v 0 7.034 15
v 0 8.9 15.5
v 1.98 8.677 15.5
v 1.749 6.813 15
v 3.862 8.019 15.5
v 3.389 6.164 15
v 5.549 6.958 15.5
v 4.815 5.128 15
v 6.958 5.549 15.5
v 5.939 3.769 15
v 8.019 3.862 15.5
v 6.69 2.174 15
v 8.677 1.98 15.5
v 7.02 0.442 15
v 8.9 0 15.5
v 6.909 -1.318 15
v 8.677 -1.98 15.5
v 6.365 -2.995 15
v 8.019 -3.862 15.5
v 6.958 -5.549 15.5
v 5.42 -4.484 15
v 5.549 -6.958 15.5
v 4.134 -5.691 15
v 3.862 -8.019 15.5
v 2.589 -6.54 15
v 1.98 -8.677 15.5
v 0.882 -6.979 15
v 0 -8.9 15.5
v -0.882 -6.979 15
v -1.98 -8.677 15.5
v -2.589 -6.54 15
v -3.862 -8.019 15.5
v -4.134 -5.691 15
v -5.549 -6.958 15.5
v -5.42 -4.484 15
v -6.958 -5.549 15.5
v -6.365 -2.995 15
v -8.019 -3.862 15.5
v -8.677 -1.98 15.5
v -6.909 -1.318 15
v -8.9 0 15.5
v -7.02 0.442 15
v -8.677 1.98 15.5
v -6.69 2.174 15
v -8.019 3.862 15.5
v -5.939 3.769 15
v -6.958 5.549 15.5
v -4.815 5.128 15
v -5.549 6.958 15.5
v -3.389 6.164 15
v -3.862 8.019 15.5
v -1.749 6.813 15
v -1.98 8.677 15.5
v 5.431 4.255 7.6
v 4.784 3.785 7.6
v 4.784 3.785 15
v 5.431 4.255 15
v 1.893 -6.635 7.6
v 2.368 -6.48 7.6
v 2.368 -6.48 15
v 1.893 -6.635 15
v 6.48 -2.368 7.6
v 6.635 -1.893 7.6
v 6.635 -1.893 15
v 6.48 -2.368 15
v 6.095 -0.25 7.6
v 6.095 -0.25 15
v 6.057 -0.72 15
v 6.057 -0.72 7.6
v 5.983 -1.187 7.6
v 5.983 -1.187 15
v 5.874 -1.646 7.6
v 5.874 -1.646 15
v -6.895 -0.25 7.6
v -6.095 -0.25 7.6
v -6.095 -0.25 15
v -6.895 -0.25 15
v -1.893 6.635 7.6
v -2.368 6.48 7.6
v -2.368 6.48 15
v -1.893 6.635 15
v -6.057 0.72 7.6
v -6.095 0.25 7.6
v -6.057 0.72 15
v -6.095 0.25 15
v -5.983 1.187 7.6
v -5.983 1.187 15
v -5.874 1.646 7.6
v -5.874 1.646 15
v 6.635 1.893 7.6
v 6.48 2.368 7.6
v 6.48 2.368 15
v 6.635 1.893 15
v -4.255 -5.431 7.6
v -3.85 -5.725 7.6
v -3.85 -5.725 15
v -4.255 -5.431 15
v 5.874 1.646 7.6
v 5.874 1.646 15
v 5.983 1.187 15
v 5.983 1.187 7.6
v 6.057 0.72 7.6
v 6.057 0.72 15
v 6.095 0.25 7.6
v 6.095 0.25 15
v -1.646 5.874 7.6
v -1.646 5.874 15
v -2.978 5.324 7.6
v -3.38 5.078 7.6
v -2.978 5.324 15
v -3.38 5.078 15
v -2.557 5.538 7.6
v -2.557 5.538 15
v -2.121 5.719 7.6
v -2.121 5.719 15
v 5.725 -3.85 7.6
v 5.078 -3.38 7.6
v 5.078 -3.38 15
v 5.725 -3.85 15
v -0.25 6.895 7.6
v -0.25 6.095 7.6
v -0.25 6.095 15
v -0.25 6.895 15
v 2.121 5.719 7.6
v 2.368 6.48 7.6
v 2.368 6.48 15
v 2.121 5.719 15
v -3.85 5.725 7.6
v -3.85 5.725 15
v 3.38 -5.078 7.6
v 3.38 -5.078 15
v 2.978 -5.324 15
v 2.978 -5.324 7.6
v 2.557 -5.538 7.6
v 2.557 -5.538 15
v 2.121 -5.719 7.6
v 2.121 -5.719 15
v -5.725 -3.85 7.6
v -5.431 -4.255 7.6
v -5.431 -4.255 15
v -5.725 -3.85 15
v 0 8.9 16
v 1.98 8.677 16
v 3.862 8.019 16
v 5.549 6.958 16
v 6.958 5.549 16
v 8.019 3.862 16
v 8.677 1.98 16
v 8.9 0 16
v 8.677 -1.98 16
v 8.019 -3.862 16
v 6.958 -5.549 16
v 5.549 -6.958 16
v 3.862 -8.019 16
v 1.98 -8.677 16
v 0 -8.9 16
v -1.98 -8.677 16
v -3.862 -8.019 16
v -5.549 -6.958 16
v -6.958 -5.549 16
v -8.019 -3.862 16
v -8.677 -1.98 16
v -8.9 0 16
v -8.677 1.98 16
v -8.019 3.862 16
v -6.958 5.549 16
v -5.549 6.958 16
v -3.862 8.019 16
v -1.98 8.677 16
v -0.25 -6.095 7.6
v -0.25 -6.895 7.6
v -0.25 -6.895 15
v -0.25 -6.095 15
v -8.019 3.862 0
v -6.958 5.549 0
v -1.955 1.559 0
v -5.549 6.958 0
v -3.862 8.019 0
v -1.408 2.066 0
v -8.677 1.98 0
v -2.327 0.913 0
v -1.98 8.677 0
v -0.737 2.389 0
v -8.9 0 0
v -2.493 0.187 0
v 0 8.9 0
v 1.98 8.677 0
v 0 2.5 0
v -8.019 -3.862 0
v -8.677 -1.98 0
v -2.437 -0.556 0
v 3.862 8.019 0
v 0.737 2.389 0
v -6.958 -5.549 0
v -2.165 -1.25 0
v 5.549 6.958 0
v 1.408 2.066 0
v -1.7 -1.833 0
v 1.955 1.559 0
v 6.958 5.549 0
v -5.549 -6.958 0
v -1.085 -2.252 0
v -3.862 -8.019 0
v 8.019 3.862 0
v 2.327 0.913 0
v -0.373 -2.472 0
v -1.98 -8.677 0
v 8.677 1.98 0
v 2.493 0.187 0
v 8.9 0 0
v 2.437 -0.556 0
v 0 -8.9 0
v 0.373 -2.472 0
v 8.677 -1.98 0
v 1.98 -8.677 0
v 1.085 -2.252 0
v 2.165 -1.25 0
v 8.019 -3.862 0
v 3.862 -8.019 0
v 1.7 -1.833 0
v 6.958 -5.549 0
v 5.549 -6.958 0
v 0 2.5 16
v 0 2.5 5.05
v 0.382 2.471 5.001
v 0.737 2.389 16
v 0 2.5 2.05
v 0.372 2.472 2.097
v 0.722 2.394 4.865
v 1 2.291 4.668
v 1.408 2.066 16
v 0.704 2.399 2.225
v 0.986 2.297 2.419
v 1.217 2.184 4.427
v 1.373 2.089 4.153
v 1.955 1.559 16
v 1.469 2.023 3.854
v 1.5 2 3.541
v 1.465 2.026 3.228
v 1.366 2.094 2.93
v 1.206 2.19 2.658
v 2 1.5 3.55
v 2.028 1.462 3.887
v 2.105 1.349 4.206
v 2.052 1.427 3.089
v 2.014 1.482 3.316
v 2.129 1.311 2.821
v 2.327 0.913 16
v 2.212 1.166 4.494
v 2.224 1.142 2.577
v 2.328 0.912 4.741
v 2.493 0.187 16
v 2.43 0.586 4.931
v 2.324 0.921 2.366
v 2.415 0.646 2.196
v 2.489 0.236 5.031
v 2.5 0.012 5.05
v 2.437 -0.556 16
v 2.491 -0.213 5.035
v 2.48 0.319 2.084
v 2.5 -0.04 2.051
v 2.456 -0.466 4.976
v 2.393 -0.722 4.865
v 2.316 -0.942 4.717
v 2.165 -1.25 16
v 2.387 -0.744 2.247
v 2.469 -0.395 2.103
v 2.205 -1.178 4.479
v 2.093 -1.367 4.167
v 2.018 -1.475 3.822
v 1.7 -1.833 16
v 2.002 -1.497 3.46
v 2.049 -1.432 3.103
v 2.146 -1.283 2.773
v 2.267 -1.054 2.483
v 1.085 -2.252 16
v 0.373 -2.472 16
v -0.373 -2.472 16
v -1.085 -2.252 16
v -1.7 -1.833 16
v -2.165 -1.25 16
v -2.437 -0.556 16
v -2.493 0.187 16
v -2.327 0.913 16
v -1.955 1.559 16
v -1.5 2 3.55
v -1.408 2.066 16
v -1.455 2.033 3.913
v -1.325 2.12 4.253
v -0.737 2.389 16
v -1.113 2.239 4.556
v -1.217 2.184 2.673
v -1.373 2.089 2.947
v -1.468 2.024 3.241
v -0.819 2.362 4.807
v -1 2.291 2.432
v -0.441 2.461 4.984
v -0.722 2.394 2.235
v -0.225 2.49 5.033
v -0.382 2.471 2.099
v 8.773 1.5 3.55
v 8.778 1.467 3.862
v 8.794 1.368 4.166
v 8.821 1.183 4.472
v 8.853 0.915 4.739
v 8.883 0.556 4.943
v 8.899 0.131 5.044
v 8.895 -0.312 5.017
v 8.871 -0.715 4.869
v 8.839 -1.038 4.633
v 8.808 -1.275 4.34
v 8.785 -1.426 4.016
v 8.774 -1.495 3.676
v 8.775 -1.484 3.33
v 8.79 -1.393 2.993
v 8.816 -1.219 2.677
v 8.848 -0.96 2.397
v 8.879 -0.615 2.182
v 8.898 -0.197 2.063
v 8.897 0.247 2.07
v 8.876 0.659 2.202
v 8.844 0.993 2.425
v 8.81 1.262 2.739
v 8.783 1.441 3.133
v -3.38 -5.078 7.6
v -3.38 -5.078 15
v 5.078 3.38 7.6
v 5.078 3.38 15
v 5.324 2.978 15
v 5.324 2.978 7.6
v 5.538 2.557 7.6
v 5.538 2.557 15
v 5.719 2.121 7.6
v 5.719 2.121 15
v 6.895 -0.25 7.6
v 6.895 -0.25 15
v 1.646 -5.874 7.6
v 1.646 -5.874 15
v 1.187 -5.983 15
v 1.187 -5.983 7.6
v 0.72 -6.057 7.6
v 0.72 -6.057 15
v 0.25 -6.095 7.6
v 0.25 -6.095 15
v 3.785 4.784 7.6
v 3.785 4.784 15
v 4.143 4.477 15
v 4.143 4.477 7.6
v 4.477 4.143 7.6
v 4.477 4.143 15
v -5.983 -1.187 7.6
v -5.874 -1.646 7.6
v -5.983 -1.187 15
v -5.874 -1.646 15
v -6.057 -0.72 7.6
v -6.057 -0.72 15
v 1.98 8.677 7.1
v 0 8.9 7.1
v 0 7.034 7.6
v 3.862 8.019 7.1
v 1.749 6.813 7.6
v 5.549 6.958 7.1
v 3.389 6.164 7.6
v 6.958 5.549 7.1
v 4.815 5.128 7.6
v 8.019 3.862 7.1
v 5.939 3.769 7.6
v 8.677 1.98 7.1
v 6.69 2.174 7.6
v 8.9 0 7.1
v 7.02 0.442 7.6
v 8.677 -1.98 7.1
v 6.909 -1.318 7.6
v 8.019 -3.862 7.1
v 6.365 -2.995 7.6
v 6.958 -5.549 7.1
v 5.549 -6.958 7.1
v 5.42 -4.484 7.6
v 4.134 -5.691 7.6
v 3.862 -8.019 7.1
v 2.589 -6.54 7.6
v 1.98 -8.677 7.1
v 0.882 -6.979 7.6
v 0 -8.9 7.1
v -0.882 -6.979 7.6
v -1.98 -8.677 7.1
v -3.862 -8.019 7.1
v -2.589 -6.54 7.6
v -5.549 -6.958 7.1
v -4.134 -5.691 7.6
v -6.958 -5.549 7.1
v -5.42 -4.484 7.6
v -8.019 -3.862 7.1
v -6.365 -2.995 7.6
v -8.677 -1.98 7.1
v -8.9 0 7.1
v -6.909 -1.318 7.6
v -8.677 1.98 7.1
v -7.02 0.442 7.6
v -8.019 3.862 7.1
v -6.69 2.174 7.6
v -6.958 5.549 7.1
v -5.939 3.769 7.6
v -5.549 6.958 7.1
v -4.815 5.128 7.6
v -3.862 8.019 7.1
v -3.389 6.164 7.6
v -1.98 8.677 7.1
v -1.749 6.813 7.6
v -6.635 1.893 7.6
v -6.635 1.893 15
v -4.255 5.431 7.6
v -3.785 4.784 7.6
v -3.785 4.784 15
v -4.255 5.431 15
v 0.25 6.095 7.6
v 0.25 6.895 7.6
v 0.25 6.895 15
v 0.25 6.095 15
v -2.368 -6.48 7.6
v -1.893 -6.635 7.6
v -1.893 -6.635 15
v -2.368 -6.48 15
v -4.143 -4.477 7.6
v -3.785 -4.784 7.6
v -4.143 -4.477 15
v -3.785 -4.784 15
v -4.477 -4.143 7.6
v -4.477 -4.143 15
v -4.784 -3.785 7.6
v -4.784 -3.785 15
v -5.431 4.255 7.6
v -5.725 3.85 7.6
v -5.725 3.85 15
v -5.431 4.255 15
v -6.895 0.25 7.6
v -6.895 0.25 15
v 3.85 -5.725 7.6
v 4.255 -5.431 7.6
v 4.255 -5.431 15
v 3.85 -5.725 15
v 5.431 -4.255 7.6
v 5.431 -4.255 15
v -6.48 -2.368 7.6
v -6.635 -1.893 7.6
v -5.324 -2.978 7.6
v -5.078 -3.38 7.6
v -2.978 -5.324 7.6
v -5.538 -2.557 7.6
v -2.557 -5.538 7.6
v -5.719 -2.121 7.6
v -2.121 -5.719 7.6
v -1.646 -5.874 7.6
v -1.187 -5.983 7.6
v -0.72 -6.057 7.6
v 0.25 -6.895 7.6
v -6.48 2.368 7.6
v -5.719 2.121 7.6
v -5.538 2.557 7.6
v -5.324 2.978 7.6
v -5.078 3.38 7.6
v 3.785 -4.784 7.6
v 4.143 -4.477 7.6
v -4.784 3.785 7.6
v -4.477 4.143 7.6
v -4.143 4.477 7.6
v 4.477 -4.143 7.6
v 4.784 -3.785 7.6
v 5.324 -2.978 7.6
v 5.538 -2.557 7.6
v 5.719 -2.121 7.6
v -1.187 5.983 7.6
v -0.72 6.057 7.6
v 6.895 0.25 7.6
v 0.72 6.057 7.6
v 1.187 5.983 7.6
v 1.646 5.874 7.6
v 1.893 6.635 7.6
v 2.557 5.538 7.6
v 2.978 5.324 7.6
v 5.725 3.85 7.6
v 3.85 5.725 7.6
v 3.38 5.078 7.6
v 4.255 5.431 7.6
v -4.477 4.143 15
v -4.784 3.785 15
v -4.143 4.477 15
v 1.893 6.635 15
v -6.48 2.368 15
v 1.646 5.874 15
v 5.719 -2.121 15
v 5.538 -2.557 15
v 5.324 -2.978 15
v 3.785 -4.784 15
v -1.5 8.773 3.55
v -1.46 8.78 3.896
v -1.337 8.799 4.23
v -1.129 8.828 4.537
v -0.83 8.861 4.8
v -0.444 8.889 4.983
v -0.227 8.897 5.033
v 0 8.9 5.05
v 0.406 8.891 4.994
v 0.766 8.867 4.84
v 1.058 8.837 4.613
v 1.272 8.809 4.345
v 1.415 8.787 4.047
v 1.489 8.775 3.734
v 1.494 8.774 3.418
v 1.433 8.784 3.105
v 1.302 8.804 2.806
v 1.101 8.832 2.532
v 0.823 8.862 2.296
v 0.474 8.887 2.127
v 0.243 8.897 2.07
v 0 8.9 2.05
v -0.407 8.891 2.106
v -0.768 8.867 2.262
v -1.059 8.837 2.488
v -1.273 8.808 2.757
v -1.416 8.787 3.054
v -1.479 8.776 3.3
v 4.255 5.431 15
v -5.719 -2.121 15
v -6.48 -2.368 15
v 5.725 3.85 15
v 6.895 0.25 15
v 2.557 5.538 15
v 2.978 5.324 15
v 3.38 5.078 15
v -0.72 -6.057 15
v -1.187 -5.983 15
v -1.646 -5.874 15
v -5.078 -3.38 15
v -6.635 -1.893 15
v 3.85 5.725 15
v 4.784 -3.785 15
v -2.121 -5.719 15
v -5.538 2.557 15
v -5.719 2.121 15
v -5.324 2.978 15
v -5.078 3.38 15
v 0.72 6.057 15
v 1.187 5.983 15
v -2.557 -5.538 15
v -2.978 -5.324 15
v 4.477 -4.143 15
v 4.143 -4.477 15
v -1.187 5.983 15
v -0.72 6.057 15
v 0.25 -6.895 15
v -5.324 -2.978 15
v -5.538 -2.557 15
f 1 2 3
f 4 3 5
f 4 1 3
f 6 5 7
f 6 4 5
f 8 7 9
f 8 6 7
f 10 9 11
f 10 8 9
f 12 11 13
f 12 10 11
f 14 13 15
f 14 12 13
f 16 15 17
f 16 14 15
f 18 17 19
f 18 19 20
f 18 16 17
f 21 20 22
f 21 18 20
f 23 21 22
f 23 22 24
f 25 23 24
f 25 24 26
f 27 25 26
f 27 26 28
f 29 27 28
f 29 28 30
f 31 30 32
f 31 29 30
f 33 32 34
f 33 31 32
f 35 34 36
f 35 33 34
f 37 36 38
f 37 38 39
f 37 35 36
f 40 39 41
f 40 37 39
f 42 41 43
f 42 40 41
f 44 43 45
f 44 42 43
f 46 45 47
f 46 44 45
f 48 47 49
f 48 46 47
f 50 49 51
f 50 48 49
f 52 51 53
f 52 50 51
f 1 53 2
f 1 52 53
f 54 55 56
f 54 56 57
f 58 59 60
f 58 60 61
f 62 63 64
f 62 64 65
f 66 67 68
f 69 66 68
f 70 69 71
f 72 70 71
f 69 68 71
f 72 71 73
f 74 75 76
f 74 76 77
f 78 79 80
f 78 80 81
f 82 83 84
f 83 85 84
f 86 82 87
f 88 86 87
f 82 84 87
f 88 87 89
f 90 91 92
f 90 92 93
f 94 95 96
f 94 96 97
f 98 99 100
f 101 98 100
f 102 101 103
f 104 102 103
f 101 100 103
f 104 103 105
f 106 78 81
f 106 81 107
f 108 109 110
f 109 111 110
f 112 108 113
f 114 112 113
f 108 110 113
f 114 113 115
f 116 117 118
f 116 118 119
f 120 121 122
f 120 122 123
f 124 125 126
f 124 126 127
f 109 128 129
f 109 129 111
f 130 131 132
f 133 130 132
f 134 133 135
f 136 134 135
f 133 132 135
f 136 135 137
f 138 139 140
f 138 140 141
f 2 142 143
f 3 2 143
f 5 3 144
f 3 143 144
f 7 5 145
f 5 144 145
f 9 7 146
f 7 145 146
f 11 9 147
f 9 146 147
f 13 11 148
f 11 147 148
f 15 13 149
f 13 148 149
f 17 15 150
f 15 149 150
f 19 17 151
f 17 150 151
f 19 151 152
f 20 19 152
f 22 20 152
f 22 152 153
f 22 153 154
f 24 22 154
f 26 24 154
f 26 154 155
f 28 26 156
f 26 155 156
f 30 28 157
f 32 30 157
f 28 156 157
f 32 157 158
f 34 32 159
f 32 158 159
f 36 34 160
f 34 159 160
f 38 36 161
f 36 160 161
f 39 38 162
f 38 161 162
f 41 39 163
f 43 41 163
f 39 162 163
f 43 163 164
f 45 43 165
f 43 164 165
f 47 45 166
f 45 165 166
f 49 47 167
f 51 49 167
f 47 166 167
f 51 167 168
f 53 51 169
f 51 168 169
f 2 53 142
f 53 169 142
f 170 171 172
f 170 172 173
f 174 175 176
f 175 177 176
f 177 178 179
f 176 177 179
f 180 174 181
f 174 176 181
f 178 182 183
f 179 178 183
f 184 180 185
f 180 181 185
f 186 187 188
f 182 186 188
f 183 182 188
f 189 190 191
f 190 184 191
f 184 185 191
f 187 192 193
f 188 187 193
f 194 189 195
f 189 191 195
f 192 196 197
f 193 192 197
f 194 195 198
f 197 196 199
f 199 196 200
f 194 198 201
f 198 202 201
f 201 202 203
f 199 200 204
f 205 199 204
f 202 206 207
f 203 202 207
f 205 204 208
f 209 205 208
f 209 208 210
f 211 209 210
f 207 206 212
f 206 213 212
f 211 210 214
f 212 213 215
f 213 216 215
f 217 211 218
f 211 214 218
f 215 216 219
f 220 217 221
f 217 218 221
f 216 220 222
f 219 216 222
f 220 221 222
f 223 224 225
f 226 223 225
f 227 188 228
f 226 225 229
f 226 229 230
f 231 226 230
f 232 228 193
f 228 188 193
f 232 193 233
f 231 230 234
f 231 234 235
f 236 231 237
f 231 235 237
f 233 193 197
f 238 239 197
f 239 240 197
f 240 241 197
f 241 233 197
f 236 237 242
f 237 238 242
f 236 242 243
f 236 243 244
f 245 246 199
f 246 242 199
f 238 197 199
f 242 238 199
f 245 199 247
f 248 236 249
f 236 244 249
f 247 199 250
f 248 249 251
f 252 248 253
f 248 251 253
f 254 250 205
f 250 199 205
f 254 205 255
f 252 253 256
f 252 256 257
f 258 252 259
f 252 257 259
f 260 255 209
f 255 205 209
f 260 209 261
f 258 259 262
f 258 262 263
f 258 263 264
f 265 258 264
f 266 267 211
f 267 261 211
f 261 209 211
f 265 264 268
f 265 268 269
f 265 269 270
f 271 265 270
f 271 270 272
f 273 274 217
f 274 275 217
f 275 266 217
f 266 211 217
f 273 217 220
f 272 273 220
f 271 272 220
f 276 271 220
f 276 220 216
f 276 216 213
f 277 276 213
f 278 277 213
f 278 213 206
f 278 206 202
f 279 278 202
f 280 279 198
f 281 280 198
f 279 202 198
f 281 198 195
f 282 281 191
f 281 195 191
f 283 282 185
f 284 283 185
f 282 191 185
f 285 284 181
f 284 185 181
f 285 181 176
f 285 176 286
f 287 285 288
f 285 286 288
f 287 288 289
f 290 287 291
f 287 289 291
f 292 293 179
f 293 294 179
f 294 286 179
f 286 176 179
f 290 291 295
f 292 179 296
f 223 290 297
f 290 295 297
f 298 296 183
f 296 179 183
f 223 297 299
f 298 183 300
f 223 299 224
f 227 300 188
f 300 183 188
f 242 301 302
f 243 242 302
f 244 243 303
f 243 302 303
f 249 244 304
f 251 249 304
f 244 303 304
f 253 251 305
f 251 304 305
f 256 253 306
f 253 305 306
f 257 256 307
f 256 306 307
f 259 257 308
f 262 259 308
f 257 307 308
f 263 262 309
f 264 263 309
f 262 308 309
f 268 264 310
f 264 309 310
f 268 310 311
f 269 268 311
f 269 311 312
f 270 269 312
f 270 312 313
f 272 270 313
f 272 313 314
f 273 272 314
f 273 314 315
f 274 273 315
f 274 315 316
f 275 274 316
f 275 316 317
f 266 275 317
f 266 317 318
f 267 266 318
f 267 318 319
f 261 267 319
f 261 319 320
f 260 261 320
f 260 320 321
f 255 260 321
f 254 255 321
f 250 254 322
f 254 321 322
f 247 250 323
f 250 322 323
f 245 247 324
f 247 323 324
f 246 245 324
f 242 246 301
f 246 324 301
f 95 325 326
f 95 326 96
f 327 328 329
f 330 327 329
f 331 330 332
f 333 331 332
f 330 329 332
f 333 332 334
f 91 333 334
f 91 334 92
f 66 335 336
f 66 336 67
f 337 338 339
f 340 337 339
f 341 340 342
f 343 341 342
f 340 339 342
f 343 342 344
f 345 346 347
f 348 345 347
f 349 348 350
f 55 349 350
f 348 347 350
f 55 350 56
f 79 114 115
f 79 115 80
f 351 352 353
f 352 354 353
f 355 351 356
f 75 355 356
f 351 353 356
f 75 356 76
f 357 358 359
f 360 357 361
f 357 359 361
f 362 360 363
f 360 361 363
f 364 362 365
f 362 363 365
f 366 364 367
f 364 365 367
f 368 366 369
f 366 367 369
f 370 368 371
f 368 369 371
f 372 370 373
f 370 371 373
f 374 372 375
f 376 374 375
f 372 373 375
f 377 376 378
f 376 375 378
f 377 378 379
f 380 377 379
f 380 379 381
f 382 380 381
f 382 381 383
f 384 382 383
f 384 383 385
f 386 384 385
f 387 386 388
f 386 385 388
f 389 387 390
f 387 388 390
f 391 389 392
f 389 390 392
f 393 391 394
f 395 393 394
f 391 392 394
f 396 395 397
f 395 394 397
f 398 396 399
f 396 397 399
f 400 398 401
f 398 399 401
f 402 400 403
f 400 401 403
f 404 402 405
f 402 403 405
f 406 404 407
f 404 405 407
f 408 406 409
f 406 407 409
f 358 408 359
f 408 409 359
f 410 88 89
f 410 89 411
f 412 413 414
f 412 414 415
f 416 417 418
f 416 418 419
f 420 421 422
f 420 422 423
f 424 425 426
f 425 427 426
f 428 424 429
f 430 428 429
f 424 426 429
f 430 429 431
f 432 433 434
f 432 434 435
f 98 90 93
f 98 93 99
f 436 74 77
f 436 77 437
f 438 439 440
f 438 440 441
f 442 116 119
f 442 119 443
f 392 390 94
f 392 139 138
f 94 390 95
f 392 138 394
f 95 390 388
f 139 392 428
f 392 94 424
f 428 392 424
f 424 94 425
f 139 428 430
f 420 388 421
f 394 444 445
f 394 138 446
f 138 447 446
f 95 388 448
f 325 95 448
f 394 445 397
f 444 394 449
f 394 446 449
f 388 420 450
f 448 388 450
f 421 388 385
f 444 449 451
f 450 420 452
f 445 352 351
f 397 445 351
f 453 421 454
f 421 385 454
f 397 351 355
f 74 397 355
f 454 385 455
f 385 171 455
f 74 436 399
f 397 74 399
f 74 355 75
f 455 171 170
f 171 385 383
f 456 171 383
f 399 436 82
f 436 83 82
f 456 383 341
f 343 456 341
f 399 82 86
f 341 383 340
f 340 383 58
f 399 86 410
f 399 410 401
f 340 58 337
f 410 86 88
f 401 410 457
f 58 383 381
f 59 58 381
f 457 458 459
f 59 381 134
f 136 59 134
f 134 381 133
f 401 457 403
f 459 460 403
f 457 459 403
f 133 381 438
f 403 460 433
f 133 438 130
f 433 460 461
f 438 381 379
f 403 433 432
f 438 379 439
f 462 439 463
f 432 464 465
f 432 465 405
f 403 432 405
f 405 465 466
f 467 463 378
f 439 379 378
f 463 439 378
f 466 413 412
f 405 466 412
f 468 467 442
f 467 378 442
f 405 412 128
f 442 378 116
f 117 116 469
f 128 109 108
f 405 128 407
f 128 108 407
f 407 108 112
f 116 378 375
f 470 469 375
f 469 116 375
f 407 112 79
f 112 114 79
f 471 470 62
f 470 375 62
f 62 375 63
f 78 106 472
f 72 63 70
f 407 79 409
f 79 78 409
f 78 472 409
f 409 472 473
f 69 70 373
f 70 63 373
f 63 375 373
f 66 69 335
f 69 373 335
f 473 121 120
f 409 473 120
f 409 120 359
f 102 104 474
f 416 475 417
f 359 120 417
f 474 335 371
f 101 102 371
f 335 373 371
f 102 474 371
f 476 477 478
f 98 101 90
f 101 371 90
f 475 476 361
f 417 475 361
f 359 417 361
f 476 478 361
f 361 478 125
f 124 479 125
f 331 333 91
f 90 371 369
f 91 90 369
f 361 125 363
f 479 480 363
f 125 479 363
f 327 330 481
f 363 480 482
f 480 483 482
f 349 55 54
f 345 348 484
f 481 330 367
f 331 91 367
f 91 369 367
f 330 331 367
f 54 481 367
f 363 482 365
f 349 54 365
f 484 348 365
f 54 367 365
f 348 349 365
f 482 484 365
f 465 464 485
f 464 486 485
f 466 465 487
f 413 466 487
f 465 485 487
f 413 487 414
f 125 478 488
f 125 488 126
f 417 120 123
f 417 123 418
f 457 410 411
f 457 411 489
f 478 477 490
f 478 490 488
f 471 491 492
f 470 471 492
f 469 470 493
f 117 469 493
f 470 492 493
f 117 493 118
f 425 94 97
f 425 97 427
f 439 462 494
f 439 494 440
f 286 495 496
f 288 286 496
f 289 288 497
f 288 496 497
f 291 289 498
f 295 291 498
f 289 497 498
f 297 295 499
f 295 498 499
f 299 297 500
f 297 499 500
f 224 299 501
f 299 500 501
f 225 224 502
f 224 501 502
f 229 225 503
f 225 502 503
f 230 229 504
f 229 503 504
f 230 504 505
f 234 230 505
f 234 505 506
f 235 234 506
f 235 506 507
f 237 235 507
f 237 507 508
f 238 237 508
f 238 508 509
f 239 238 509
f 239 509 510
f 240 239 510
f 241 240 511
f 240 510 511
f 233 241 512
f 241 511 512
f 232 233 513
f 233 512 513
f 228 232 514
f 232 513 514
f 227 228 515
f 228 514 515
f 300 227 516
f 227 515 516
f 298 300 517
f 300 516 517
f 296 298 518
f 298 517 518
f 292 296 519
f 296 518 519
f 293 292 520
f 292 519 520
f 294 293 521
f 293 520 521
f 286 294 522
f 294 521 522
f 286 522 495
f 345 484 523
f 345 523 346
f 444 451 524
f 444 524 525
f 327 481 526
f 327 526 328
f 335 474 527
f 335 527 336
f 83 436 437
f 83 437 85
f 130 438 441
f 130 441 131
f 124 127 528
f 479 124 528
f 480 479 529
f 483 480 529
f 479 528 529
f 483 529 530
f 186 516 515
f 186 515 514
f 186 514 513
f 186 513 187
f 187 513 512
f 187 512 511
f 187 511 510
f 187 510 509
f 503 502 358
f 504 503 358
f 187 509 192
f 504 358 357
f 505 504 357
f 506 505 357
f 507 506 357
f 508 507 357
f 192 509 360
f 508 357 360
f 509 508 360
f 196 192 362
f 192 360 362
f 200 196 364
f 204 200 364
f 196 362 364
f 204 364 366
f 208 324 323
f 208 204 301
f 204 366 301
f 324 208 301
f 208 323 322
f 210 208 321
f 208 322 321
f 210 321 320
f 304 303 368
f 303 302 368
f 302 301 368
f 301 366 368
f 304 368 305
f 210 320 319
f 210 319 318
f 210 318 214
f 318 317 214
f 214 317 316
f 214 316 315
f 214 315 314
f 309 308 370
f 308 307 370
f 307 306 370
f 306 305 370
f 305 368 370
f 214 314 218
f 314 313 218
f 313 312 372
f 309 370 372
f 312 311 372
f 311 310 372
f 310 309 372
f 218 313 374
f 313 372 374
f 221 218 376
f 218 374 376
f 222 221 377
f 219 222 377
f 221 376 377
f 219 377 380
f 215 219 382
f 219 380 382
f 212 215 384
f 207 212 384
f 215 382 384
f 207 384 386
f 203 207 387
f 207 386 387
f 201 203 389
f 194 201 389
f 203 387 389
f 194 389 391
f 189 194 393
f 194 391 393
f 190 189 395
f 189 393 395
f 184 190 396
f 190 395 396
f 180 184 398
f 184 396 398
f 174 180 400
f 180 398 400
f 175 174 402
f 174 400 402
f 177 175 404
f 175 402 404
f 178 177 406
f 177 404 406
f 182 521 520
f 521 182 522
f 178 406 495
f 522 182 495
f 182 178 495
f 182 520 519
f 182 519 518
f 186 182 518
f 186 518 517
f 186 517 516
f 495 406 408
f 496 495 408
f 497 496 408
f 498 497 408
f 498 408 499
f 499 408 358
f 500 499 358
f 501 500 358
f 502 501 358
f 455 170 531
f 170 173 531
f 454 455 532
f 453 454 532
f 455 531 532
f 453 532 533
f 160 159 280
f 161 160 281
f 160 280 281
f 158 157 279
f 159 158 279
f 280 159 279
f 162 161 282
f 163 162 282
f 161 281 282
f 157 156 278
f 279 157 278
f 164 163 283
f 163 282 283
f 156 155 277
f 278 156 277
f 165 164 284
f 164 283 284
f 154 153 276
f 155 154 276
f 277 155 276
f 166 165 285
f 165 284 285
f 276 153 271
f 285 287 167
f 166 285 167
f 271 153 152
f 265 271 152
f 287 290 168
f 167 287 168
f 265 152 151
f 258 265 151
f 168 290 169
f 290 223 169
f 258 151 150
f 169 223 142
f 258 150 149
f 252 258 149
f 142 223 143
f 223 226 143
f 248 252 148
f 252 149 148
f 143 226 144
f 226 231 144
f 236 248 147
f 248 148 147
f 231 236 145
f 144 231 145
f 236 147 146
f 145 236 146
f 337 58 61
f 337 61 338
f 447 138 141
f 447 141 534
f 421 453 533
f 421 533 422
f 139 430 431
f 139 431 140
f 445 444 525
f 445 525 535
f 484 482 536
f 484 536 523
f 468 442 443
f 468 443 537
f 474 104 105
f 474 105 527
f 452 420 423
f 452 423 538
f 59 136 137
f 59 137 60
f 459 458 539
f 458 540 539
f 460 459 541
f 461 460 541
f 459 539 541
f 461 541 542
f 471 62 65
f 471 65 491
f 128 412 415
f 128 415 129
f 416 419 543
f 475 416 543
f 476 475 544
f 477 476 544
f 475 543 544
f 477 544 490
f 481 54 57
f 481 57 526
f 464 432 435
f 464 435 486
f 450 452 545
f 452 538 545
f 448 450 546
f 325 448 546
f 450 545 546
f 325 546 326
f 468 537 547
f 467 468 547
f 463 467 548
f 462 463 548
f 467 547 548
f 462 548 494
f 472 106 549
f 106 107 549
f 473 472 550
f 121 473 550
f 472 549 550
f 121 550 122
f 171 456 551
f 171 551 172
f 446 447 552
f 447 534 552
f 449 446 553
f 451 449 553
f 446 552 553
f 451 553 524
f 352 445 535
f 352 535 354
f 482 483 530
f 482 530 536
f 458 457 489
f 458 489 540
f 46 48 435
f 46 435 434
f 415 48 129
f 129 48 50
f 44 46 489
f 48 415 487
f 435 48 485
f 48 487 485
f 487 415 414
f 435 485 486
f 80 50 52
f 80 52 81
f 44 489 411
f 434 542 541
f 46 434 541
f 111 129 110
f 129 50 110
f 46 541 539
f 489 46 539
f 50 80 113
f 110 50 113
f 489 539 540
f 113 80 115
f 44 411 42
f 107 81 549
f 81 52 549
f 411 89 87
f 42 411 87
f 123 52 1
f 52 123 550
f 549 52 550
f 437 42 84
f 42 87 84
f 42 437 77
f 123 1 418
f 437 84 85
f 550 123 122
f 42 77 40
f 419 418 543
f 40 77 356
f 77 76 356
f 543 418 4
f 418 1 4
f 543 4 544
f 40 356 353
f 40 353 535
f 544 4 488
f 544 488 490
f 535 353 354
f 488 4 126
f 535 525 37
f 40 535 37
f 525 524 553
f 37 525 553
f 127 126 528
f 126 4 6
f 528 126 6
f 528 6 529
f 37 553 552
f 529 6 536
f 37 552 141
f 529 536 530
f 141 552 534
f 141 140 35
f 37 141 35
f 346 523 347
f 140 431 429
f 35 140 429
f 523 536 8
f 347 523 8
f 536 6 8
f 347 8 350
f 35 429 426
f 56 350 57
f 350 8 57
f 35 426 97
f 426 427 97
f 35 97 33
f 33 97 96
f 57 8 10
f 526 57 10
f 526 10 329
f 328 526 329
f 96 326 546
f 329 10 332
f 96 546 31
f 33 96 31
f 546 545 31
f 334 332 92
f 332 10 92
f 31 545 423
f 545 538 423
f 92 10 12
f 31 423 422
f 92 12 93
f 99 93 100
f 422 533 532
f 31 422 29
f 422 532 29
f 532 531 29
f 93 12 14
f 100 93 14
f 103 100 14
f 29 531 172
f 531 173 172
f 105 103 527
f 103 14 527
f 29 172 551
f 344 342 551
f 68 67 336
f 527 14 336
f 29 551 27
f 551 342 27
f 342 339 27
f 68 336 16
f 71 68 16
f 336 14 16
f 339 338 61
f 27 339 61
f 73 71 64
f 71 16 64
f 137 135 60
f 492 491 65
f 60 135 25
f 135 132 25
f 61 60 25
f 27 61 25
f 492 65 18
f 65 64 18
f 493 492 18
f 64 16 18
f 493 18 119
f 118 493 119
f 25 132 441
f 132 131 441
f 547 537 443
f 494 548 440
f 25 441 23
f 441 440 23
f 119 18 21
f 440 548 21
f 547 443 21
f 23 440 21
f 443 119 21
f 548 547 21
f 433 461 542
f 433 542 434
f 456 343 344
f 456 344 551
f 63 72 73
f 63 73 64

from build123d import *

# Parameters (mm, degrees)
CHAMFER1_SIZE       = 0.5
CHAMFER1_SIZE2      = 1.866025404
CHAMFER2_SIZE       = 0.5
CHAMFER2_SIZE2      = 1.866025404
BOSS_EXTRUDE1_DEPTH = 7.4
SKETCH6_R           = 1.5
CUT_EXTRUDE1_DEPTH  = 10
CIRPATTERN1_COUNT   = 2
CIRPATTERN1_ANGLE   = 270


with BuildPart() as part:
    # Sketch2 → Revolve1 (revolve)
    with BuildSketch(Plane(origin=(0, 0, 0), x_dir=(0, 0, -1), z_dir=(1, 0, 0))):
        Polygon((-16, 2.5), (0, 2.5), (0, 8.9), (-7.6, 8.9), (-7.6, 6.1), (-15, 6.1), (-15, 8.9), (-16, 8.9), align=None)
    revolve(axis=Axis((0, 0, 79.609460318), (0, 0, -1)))

    # Chamfer1
    chamfer1_edges = [part.edges().sort_by_distance(p)[0] for p in [
        (0, -8.9, 15),
    ]]
    chamfer1_side = [part.faces().sort_by_distance(p)[0] for p in [
        (0, -8.9, 15.5),
    ]]
    chamfer(chamfer1_edges, length=CHAMFER1_SIZE, length2=CHAMFER1_SIZE2, reference=chamfer1_side[0])

    # Chamfer2
    chamfer2_edges = [part.edges().sort_by_distance(p)[0] for p in [
        (0, -8.9, 7.6),
    ]]
    chamfer2_side = [part.faces().sort_by_distance(p)[0] for p in [
        (0, -8.9, 3.8),
    ]]
    chamfer(chamfer2_edges, length=CHAMFER2_SIZE, length2=CHAMFER2_SIZE2, reference=chamfer2_side[0])

    # Sketch4 → Boss-Extrude1 (add)
    with BuildSketch(Plane.XY.offset(7.6)):
        with BuildLine():
            Line((1.645655792, 5.873824735), (1.892869388, 6.634669948))
            Line((1.892869388, 6.634669948), (2.368397646, 6.48016145))
            Line((2.368397646, 6.48016145), (2.121184051, 5.719316237))
            ThreePointArc((2.121184051, 5.719316237), (1.885003666, 5.801444749), (1.645655792, 5.873824735))
        make_face()
        with BuildLine():
            Line((-0.25, 6.094874896), (-0.25, 6.894874896))
            Line((-0.25, 6.894874896), (0.25, 6.894874896))
            Line((0.25, 6.894874896), (0.25, 6.094874896))
            ThreePointArc((0.25, 6.094874896), (0, 6.1), (-0.25, 6.094874896))
        make_face()
        with BuildLine():
            Line((3.38022333, 5.077803683), (3.850451532, 5.725017278))
            Line((3.850451532, 5.725017278), (4.254960029, 5.431124652))
            Line((4.254960029, 5.431124652), (3.784731827, 4.783911057))
            ThreePointArc((3.784731827, 4.783911057), (3.585490039, 4.935003666), (3.38022333, 5.077803683))
        make_face()
        with BuildLine():
            Line((4.783911057, 3.784731827), (5.431124652, 4.254960029))
            Line((5.431124652, 4.254960029), (5.725017278, 3.850451532))
            Line((5.725017278, 3.850451532), (5.077803683, 3.38022333))
            ThreePointArc((5.077803683, 3.38022333), (4.935003666, 3.585490039), (4.783911057, 3.784731827))
        make_face()
        with BuildLine():
            Line((5.719316237, 2.121184051), (6.48016145, 2.368397646))
            Line((6.48016145, 2.368397646), (6.634669948, 1.892869388))
            Line((6.634669948, 1.892869388), (5.873824735, 1.645655792))
            ThreePointArc((5.873824735, 1.645655792), (5.801444749, 1.885003666), (5.719316237, 2.121184051))
        make_face()
        with BuildLine():
            Line((6.094874896, 0.25), (6.894874896, 0.25))
            Line((6.894874896, 0.25), (6.894874896, -0.25))
            Line((6.894874896, -0.25), (6.094874896, -0.25))
            ThreePointArc((6.094874896, -0.25), (6.1, 0), (6.094874896, 0.25))
        make_face()
        with BuildLine():
            Line((5.873824735, -1.645655792), (6.634669948, -1.892869388))
            Line((6.634669948, -1.892869388), (6.48016145, -2.368397646))
            Line((6.48016145, -2.368397646), (5.719316237, -2.121184051))
            ThreePointArc((5.719316237, -2.121184051), (5.801444749, -1.885003666), (5.873824735, -1.645655792))
        make_face()
        with BuildLine():
            Line((5.077803683, -3.38022333), (5.725017278, -3.850451532))
            Line((5.725017278, -3.850451532), (5.431124652, -4.254960029))
            Line((5.431124652, -4.254960029), (4.783911057, -3.784731827))
            ThreePointArc((4.783911057, -3.784731827), (4.935003666, -3.585490039), (5.077803683, -3.38022333))
        make_face()
        with BuildLine():
            Line((3.784731827, -4.783911057), (4.254960029, -5.431124652))
            Line((4.254960029, -5.431124652), (3.850451532, -5.725017278))
            Line((3.850451532, -5.725017278), (3.38022333, -5.077803683))
            ThreePointArc((3.38022333, -5.077803683), (3.585490039, -4.935003666), (3.784731827, -4.783911057))
        make_face()
        with BuildLine():
            Line((2.121184051, -5.719316237), (2.368397646, -6.48016145))
            Line((2.368397646, -6.48016145), (1.892869388, -6.634669948))
            Line((1.892869388, -6.634669948), (1.645655792, -5.873824735))
            ThreePointArc((1.645655792, -5.873824735), (1.885003666, -5.801444749), (2.121184051, -5.719316237))
        make_face()
        with BuildLine():
            Line((0.25, -6.094874896), (0.25, -6.894874896))
            Line((0.25, -6.894874896), (-0.25, -6.894874896))
            Line((-0.25, -6.894874896), (-0.25, -6.094874896))
            ThreePointArc((-0.25, -6.094874896), (0, -6.1), (0.25, -6.094874896))
        make_face()
        with BuildLine():
            Line((-1.645655792, -5.873824735), (-1.892869388, -6.634669948))
            Line((-1.892869388, -6.634669948), (-2.368397646, -6.48016145))
            Line((-2.368397646, -6.48016145), (-2.121184051, -5.719316237))
            ThreePointArc((-2.121184051, -5.719316237), (-1.885003666, -5.801444749), (-1.645655792, -5.873824735))
        make_face()
        with BuildLine():
            Line((-3.38022333, -5.077803683), (-3.850451532, -5.725017278))
            Line((-3.850451532, -5.725017278), (-4.254960029, -5.431124652))
            Line((-4.254960029, -5.431124652), (-3.784731827, -4.783911057))
            ThreePointArc((-3.784731827, -4.783911057), (-3.585490039, -4.935003666), (-3.38022333, -5.077803683))
        make_face()
        with BuildLine():
            Line((-4.783911057, -3.784731827), (-5.431124652, -4.254960029))
            Line((-5.431124652, -4.254960029), (-5.725017278, -3.850451532))
            Line((-5.725017278, -3.850451532), (-5.077803683, -3.38022333))
            ThreePointArc((-5.077803683, -3.38022333), (-4.935003666, -3.585490039), (-4.783911057, -3.784731827))
        make_face()
        with BuildLine():
            Line((-5.719316237, -2.121184051), (-6.48016145, -2.368397646))
            Line((-6.48016145, -2.368397646), (-6.634669948, -1.892869388))
            Line((-6.634669948, -1.892869388), (-5.873824735, -1.645655792))
            ThreePointArc((-5.873824735, -1.645655792), (-5.801444749, -1.885003666), (-5.719316237, -2.121184051))
        make_face()
        with BuildLine():
            Line((-6.094874896, -0.25), (-6.894874896, -0.25))
            Line((-6.894874896, -0.25), (-6.894874896, 0.25))
            Line((-6.894874896, 0.25), (-6.094874896, 0.25))
            ThreePointArc((-6.094874896, 0.25), (-6.1, 0), (-6.094874896, -0.25))
        make_face()
        with BuildLine():
            Line((-5.873824735, 1.645655792), (-6.634669948, 1.892869388))
            Line((-6.634669948, 1.892869388), (-6.48016145, 2.368397646))
            Line((-6.48016145, 2.368397646), (-5.719316237, 2.121184051))
            ThreePointArc((-5.719316237, 2.121184051), (-5.801444749, 1.885003666), (-5.873824735, 1.645655792))
        make_face()
        with BuildLine():
            Line((-5.077803683, 3.38022333), (-5.725017278, 3.850451532))
            Line((-5.725017278, 3.850451532), (-5.431124652, 4.254960029))
            Line((-5.431124652, 4.254960029), (-4.783911057, 3.784731827))
            ThreePointArc((-4.783911057, 3.784731827), (-4.935003666, 3.585490039), (-5.077803683, 3.38022333))
        make_face()
        with BuildLine():
            Line((-3.784731827, 4.783911057), (-4.254960029, 5.431124652))
            Line((-4.254960029, 5.431124652), (-3.850451532, 5.725017278))
            Line((-3.850451532, 5.725017278), (-3.38022333, 5.077803683))
            ThreePointArc((-3.38022333, 5.077803683), (-3.585490039, 4.935003666), (-3.784731827, 4.783911057))
        make_face()
        with BuildLine():
            Line((-2.121184051, 5.719316237), (-2.368397646, 6.48016145))
            Line((-2.368397646, 6.48016145), (-1.892869388, 6.634669948))
            Line((-1.892869388, 6.634669948), (-1.645655792, 5.873824735))
            ThreePointArc((-1.645655792, 5.873824735), (-1.885003666, 5.801444749), (-2.121184051, 5.719316237))
        make_face()
    extrude(amount=BOSS_EXTRUDE1_DEPTH)

    # Sketch6 → Cut-Extrude1 (cut)
    with BuildSketch(Plane(origin=(0, 8.9, 0), x_dir=(-1, 0, 0), z_dir=(0, 1, 0))):
        with Locations((0, 3.55)):
            Circle(SKETCH6_R)
    cut_extrude1 = extrude(amount=-CUT_EXTRUDE1_DEPTH, mode=Mode.SUBTRACT)

    # CirPattern1: Cut-Extrude1 ×2 about axis
    cirpattern1_axis = Axis((0, 0, 0), (0, 0, 1))
    for i in range(1, CIRPATTERN1_COUNT):
        add(cut_extrude1.rotate(cirpattern1_axis, i * CIRPATTERN1_ANGLE / (CIRPATTERN1_COUNT - 1)), mode=Mode.SUBTRACT)


solid = part.part
